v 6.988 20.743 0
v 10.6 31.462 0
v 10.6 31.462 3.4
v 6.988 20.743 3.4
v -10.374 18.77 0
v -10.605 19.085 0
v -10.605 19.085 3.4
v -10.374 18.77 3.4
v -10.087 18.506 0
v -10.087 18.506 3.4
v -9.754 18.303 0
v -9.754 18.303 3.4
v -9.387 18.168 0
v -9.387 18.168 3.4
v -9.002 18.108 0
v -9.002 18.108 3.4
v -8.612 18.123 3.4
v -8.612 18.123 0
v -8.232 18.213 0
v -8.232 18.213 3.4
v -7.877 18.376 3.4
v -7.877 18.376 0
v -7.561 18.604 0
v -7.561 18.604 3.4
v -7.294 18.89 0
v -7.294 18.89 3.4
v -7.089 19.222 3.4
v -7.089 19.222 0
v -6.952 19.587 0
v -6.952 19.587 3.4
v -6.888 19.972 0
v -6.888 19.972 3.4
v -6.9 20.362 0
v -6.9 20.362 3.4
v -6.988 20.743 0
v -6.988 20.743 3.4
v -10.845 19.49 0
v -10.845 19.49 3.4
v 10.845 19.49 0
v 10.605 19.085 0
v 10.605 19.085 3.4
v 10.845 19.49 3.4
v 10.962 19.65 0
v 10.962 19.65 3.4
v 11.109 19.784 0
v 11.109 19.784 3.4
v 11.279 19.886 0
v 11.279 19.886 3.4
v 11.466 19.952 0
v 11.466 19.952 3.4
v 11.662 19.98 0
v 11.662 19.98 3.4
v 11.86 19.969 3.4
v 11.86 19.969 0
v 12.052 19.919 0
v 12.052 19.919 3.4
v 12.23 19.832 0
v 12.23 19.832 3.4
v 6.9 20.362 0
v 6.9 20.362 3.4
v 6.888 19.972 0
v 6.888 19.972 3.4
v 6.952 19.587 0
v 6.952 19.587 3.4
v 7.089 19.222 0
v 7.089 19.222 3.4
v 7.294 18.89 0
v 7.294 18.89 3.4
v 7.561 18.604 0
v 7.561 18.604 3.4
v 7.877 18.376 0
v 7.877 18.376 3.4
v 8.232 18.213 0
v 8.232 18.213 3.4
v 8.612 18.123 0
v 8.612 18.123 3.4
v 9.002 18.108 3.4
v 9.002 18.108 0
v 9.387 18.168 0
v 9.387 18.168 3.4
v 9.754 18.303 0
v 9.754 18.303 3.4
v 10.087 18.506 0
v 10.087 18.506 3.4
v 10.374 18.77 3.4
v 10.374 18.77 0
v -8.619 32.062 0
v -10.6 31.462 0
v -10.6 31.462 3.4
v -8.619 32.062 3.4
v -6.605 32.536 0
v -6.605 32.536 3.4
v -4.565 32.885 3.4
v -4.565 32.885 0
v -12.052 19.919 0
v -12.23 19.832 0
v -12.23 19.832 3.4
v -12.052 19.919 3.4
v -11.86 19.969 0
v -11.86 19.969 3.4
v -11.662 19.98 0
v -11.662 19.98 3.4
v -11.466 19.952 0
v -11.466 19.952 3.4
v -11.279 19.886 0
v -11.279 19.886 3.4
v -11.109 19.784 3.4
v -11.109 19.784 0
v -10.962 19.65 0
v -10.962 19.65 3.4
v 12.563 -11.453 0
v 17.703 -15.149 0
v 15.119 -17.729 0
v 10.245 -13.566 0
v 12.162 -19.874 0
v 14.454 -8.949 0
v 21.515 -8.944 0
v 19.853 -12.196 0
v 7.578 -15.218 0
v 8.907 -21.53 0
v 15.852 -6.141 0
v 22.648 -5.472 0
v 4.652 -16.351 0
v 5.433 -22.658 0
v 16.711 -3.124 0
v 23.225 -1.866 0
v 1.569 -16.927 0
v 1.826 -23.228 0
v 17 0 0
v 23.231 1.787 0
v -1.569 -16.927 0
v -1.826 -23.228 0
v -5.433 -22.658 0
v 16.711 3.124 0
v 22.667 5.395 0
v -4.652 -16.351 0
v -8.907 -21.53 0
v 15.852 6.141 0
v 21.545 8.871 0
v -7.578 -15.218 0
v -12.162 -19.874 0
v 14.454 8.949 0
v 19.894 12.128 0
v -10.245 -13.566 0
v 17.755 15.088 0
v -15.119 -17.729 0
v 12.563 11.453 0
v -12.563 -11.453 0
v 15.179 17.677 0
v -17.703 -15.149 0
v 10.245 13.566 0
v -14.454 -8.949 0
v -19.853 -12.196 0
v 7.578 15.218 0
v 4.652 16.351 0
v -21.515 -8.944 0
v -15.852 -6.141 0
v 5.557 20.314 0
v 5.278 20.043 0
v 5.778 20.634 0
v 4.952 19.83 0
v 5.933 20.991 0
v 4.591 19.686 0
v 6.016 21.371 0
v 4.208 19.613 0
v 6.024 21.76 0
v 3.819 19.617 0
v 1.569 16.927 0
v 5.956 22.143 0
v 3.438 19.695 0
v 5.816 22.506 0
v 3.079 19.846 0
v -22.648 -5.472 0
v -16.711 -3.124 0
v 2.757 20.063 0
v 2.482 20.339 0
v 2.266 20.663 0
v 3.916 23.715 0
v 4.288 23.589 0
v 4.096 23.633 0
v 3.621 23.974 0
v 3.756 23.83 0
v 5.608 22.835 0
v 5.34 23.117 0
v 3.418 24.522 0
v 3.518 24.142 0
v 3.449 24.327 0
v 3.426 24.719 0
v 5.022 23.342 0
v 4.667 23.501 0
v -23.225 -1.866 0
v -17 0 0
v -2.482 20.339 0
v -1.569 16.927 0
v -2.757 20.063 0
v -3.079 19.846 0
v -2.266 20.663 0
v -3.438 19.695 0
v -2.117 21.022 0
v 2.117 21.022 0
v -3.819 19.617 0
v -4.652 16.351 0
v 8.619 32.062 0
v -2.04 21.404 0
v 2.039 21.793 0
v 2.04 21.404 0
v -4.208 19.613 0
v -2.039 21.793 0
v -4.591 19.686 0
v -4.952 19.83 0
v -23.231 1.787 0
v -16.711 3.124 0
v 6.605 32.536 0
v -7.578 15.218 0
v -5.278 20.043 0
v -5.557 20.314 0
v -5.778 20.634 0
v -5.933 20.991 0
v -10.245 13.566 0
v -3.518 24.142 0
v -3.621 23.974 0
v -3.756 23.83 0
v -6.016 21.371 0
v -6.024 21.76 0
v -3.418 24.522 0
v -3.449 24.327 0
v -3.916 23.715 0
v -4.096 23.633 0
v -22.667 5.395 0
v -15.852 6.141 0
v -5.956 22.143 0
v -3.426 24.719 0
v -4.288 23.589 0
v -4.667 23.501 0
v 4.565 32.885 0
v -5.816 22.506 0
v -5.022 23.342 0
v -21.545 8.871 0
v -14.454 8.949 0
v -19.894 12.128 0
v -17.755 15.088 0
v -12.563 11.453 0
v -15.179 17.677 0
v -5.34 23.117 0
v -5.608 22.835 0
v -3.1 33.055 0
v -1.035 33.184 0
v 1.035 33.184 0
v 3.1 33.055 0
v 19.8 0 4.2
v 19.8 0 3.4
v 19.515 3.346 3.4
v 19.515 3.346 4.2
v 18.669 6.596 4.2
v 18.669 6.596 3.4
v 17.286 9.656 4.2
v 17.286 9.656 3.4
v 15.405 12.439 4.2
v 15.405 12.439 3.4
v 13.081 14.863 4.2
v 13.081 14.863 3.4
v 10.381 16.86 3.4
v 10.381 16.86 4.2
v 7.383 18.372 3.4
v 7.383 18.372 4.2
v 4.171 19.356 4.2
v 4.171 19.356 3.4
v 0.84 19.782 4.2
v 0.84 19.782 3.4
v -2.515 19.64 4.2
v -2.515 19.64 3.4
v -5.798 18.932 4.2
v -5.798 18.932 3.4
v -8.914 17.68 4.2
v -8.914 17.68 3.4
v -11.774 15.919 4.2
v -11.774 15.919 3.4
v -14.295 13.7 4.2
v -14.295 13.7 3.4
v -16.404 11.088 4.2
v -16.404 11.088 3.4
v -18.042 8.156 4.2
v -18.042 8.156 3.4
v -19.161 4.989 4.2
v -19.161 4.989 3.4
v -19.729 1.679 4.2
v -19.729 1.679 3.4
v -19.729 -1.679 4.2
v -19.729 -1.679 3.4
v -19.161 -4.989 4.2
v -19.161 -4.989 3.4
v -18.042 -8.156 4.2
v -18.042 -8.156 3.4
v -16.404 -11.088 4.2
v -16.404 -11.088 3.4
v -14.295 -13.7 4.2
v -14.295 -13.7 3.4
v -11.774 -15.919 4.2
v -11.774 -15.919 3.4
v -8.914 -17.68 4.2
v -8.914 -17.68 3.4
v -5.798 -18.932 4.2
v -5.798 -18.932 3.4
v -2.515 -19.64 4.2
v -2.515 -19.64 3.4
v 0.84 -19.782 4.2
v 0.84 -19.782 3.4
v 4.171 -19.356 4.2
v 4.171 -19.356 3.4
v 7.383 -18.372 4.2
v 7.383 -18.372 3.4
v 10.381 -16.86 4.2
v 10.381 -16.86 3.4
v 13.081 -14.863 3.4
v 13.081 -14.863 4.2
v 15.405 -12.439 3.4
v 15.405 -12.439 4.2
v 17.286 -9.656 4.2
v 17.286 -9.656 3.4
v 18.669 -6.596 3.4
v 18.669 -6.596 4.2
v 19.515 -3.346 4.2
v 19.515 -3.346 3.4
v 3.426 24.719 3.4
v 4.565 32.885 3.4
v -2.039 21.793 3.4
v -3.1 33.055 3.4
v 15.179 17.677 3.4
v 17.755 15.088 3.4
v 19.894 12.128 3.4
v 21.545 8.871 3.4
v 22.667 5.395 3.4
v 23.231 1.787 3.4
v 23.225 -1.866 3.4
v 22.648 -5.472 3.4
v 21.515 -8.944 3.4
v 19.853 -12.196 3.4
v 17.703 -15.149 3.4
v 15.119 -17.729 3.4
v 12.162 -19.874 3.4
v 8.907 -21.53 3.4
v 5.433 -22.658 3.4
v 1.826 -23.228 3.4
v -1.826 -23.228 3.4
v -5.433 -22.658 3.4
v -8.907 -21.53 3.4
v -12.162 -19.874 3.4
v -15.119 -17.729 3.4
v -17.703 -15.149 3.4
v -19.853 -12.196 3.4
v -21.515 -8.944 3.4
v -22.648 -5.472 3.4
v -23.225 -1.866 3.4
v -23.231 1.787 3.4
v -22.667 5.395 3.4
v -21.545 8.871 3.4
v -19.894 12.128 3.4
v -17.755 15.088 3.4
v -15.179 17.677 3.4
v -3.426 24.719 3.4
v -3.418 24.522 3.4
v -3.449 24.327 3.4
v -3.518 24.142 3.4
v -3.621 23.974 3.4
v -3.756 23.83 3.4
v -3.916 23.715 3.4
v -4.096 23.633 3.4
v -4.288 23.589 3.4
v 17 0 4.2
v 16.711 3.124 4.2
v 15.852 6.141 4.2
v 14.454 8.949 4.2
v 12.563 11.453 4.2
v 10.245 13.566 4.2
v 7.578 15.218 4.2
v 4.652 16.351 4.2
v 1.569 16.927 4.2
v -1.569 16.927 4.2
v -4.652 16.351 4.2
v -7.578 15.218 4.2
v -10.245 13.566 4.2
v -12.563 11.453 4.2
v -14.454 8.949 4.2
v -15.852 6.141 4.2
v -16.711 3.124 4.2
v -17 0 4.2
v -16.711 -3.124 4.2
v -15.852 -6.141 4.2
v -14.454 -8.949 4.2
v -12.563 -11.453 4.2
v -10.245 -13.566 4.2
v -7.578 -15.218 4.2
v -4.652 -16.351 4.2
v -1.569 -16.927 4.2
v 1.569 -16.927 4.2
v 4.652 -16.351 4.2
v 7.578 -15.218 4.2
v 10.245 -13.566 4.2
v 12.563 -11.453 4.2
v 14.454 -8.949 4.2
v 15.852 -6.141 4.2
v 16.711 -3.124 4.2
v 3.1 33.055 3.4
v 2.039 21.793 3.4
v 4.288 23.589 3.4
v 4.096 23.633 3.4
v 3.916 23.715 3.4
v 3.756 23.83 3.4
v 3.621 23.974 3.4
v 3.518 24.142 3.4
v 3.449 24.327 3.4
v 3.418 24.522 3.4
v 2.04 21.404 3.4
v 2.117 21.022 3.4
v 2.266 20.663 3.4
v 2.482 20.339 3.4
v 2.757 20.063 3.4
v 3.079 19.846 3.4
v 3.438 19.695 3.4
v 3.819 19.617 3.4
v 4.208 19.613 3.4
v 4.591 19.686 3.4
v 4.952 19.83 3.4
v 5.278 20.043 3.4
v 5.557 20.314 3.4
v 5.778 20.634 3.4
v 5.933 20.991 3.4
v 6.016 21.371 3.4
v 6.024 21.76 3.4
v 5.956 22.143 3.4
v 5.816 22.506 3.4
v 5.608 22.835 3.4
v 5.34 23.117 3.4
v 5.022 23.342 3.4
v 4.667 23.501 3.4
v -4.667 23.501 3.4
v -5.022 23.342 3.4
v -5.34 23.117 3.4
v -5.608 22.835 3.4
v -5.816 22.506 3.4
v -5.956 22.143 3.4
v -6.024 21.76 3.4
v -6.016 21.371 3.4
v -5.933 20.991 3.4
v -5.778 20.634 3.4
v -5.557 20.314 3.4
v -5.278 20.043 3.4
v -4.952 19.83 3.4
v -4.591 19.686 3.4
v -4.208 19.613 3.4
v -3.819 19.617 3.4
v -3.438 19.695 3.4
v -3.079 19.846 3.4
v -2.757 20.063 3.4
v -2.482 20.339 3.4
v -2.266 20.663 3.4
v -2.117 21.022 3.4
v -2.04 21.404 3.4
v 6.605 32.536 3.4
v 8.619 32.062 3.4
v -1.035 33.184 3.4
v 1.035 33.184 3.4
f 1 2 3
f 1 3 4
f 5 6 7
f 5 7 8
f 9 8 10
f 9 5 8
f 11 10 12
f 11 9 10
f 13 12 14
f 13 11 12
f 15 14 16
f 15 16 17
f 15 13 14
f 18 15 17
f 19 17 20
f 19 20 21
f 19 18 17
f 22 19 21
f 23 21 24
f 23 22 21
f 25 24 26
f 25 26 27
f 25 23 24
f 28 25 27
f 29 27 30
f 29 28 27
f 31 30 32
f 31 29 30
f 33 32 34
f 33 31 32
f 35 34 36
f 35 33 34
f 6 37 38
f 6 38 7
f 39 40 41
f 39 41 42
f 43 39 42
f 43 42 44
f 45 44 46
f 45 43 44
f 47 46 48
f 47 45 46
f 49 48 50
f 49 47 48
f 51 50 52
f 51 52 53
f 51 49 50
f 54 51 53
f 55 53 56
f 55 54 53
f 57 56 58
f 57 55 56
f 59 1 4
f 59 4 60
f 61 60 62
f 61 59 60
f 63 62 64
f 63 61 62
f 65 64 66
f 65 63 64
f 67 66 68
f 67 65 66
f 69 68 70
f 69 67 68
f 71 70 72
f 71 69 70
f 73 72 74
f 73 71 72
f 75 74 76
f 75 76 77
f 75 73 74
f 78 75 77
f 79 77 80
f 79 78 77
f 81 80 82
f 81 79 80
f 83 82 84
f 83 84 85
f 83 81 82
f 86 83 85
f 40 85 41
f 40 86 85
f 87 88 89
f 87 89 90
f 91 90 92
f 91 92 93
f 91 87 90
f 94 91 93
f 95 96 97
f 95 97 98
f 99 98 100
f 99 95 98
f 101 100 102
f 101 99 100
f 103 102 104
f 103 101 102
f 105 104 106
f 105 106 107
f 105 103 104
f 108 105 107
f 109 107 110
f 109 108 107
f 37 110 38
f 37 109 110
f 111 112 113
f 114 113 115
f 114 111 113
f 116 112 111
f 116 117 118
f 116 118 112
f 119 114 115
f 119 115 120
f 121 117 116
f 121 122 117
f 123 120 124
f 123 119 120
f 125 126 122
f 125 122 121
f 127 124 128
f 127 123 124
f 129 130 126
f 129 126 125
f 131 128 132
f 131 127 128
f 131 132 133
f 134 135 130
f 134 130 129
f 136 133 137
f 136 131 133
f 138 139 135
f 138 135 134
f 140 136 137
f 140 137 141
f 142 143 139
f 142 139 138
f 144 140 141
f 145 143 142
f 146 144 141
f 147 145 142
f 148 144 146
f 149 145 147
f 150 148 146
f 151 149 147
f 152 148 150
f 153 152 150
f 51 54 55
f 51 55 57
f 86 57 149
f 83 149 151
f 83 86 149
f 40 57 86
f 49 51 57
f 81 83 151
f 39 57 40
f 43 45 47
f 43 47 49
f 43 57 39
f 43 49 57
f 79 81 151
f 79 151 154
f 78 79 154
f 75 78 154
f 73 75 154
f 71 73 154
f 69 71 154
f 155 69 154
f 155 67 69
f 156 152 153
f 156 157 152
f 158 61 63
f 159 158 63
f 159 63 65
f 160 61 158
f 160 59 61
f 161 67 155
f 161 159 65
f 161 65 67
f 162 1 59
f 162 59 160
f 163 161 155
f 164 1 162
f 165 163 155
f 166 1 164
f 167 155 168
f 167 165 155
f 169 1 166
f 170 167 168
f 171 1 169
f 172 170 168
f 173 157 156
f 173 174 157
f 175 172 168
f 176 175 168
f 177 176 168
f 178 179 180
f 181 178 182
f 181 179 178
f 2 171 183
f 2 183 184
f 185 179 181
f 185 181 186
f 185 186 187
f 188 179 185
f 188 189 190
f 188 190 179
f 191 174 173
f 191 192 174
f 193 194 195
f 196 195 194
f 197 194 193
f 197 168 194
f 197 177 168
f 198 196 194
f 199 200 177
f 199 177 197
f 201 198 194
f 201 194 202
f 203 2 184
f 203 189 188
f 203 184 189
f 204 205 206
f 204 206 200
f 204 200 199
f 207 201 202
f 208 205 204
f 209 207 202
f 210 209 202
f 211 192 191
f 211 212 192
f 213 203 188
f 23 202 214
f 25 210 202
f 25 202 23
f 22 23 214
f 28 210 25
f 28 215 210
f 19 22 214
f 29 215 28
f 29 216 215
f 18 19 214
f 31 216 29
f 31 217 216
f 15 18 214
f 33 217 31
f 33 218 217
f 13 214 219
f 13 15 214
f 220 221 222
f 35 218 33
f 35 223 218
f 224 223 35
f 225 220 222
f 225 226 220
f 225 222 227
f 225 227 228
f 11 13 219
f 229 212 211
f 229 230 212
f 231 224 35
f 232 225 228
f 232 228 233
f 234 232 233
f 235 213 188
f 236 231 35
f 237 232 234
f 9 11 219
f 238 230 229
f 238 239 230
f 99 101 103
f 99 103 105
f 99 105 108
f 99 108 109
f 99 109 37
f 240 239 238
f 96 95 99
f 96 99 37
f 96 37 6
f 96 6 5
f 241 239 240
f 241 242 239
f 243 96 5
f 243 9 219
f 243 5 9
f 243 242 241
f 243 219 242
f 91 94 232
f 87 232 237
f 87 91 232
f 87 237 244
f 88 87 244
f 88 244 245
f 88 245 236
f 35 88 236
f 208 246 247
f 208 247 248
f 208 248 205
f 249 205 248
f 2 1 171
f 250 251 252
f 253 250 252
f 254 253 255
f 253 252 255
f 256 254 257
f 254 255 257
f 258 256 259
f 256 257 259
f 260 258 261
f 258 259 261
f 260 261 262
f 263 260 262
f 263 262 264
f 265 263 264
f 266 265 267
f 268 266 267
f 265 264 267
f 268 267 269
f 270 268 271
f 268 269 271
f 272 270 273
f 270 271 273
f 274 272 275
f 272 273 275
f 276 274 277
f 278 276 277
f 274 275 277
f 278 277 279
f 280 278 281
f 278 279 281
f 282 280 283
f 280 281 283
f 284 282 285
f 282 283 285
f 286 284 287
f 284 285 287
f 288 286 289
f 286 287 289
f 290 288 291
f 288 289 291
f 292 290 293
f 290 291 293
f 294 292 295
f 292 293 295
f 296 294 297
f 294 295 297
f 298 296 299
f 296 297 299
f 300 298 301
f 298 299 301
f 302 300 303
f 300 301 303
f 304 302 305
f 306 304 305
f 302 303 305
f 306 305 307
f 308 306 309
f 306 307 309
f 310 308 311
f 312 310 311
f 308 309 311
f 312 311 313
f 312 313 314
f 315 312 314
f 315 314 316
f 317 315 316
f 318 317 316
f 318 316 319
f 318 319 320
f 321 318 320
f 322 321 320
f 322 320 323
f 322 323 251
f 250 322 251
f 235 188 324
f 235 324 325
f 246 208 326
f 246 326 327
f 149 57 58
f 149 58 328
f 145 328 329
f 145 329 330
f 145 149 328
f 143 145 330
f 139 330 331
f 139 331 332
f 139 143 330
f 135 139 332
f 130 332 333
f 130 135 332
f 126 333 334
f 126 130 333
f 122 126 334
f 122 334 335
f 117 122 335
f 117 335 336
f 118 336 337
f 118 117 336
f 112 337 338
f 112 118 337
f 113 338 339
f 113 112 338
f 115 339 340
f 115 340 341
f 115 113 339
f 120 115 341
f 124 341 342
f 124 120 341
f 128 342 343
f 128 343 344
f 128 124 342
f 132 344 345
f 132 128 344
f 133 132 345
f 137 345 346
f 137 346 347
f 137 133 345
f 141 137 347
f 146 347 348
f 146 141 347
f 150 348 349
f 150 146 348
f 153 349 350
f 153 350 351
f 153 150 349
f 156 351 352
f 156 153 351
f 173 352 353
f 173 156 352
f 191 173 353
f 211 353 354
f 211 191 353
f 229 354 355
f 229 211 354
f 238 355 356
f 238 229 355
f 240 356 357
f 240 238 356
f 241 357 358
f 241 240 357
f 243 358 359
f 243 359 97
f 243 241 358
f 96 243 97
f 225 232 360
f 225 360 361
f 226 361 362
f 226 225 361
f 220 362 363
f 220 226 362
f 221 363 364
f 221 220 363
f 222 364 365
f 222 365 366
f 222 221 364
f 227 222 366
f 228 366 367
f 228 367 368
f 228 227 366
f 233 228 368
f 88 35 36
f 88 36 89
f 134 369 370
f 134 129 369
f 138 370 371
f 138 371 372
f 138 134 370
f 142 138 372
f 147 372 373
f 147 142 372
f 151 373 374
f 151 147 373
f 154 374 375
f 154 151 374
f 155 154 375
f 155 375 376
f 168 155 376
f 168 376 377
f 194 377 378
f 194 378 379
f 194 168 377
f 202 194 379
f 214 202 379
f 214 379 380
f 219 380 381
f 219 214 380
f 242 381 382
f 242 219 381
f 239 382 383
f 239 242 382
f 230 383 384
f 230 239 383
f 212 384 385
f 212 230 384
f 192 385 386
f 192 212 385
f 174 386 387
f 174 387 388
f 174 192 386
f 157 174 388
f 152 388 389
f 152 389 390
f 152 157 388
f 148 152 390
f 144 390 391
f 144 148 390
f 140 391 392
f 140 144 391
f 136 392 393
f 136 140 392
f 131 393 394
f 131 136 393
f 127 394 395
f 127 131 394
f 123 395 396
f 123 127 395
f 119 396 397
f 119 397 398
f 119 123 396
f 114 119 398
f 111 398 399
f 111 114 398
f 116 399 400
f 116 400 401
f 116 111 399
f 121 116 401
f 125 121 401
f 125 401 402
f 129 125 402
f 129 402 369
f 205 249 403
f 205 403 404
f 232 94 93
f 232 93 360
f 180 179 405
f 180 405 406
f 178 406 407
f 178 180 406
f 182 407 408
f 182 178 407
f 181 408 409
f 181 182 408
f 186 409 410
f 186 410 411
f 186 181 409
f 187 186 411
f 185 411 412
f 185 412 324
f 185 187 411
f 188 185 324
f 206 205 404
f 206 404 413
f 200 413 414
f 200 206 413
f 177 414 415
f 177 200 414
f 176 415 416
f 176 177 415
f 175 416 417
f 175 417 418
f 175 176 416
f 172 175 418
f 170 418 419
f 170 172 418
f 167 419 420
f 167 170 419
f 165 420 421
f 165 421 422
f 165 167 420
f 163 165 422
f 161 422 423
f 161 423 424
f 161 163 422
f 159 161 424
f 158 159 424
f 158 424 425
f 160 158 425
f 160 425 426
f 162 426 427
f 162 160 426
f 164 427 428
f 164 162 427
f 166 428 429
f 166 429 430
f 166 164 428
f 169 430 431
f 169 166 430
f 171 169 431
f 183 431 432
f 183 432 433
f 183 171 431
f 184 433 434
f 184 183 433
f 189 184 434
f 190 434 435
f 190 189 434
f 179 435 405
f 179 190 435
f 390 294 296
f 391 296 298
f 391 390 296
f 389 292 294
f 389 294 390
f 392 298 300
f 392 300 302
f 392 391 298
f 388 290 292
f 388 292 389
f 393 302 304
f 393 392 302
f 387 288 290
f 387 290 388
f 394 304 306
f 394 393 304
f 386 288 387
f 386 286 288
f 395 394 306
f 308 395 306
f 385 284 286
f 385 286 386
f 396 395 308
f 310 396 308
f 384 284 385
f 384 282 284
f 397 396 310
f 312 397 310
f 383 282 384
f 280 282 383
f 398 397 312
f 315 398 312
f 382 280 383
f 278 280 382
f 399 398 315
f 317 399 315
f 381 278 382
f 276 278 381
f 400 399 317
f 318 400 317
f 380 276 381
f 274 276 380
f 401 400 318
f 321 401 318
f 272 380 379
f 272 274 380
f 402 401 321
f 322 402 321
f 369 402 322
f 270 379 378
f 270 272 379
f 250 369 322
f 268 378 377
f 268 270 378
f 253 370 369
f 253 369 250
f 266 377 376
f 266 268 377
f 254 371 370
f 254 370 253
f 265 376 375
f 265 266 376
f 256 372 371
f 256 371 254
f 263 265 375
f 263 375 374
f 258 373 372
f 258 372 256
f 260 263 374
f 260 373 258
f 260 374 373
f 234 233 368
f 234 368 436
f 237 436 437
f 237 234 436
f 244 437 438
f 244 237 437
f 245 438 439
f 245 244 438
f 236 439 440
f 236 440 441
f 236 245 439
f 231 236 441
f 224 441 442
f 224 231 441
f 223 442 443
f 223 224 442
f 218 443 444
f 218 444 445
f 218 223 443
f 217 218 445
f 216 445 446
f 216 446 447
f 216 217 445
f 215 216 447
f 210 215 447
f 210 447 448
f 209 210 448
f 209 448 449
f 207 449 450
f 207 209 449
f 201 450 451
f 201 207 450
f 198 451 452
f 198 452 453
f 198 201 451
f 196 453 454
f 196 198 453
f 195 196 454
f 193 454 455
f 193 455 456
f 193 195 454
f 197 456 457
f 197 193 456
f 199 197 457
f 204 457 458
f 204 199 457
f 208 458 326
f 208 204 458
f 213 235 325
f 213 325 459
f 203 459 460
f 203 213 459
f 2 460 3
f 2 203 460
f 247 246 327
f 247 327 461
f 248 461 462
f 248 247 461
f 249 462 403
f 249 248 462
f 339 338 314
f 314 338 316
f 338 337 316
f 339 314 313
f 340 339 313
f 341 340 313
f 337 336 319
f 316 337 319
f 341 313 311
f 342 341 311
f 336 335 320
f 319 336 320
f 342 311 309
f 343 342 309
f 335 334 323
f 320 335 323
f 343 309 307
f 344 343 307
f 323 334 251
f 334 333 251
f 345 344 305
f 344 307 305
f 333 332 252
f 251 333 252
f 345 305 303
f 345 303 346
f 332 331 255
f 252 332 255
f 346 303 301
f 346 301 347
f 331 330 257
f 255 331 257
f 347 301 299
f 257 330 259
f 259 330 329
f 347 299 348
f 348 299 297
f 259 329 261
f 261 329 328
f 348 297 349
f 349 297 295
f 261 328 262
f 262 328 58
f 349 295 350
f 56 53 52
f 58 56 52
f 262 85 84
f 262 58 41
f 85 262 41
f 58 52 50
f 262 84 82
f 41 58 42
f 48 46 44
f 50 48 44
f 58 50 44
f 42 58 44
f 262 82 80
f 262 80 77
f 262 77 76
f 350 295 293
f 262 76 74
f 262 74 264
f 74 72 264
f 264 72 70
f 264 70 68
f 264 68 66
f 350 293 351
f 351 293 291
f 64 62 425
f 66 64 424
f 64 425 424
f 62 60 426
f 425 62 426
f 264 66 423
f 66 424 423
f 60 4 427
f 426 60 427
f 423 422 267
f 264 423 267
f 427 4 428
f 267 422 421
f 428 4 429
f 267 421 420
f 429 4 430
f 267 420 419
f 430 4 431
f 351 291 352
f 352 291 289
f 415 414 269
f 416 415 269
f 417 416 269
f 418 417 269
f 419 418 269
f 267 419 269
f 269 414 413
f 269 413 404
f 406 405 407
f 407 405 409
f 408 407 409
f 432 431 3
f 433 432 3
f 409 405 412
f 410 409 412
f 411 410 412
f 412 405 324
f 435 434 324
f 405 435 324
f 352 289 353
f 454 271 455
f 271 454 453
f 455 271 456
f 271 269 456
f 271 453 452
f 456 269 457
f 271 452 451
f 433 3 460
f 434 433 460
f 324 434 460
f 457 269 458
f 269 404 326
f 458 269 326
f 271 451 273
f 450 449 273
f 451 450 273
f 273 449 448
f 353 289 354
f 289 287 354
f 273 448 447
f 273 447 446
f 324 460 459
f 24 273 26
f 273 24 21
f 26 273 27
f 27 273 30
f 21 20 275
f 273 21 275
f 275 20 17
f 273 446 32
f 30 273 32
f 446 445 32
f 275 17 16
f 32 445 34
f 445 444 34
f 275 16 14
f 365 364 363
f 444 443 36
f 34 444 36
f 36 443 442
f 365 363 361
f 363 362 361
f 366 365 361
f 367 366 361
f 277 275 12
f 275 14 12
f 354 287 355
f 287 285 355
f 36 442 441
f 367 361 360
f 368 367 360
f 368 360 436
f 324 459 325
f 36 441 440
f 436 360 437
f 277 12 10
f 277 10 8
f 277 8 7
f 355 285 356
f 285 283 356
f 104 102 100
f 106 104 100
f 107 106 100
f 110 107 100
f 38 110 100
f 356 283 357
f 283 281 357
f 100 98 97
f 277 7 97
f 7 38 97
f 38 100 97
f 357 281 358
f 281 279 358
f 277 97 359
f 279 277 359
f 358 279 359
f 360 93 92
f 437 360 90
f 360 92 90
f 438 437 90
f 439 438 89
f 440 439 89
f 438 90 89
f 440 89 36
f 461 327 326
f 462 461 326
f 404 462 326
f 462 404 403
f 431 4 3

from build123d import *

# Parameters (mm, degrees)
ESQUISSE1_R        = 17
BOSS_EXTRU_1_DEPTH = 3.4
ESQUISSE2_R        = 19.8
ESQUISSE2_R_2      = 17
BOSS_EXTRU_2_DEPTH = 0.8


with BuildPart() as part:
    # Esquisse1 → Boss.-Extru.1 (new body)
    with BuildSketch(Plane.XY):
        with BuildLine():
            Line((10.604819554, 19.085304433), (10.844597942, 19.490397698))
            ThreePointArc((10.844597942, 19.490397698), (11.465620902, 19.951920532), (12.230041829, 19.832197983))
            ThreePointArc((12.230041829, 19.832197983), (0, -23.3), (-12.230041829, 19.832197983))
            ThreePointArc((-12.230041829, 19.832197983), (-11.465620902, 19.951920532), (-10.844597942, 19.490397698))
            Line((-10.844597942, 19.490397698), (-10.604819554, 19.085304433))
            ThreePointArc((-10.604819554, 19.085304433), (-8.050510374, 18.285863427), (-6.988397979, 20.74259267))
            Line((-6.988397979, 20.74259267), (-10.6, 31.462358462))
            ThreePointArc((-10.6, 31.462358462), (-7.615939872, 32.314663233), (-4.565333975, 32.884612294))
            Line((-4.565333975, 32.884612294), (-3.426014723, 24.718632018))
            ThreePointArc((-3.426014723, 24.718632018), (-3.621264858, 23.974046302), (-4.287669622, 23.58877342))
            ThreePointArc((-4.287669622, 23.58877342), (-5.278203354, 20.042601197), (-2.038983016, 21.793014323))
            Line((-2.038983016, 21.793014323), (-3.1, 33.054954243))
            ThreePointArc((-3.1, 33.054954243), (0, 33.2), (3.1, 33.054954243))
            Line((3.1, 33.054954243), (2.038983016, 21.793014323))
            ThreePointArc((2.038983016, 21.793014323), (5.278203354, 20.042601197), (4.287669622, 23.58877342))
            ThreePointArc((4.287669622, 23.58877342), (3.621264858, 23.974046302), (3.426014723, 24.718632018))
            Line((3.426014723, 24.718632018), (4.565333975, 32.884612294))
            ThreePointArc((4.565333975, 32.884612294), (7.615939872, 32.314663233), (10.6, 31.462358462))
            Line((10.6, 31.462358462), (6.988397979, 20.74259267))
            ThreePointArc((6.988397979, 20.74259267), (8.050510374, 18.285863427), (10.604819554, 19.085304433))
        make_face()
        Circle(ESQUISSE1_R, mode=Mode.SUBTRACT)
    extrude(amount=BOSS_EXTRU_1_DEPTH)

    # Esquisse2 → Boss.-Extru.2 (add)
    with BuildSketch(Plane.XY.offset(3.4)):
        Circle(ESQUISSE2_R)
        Circle(ESQUISSE2_R_2, mode=Mode.SUBTRACT)
    extrude(amount=BOSS_EXTRU_2_DEPTH)


solid = part.part
